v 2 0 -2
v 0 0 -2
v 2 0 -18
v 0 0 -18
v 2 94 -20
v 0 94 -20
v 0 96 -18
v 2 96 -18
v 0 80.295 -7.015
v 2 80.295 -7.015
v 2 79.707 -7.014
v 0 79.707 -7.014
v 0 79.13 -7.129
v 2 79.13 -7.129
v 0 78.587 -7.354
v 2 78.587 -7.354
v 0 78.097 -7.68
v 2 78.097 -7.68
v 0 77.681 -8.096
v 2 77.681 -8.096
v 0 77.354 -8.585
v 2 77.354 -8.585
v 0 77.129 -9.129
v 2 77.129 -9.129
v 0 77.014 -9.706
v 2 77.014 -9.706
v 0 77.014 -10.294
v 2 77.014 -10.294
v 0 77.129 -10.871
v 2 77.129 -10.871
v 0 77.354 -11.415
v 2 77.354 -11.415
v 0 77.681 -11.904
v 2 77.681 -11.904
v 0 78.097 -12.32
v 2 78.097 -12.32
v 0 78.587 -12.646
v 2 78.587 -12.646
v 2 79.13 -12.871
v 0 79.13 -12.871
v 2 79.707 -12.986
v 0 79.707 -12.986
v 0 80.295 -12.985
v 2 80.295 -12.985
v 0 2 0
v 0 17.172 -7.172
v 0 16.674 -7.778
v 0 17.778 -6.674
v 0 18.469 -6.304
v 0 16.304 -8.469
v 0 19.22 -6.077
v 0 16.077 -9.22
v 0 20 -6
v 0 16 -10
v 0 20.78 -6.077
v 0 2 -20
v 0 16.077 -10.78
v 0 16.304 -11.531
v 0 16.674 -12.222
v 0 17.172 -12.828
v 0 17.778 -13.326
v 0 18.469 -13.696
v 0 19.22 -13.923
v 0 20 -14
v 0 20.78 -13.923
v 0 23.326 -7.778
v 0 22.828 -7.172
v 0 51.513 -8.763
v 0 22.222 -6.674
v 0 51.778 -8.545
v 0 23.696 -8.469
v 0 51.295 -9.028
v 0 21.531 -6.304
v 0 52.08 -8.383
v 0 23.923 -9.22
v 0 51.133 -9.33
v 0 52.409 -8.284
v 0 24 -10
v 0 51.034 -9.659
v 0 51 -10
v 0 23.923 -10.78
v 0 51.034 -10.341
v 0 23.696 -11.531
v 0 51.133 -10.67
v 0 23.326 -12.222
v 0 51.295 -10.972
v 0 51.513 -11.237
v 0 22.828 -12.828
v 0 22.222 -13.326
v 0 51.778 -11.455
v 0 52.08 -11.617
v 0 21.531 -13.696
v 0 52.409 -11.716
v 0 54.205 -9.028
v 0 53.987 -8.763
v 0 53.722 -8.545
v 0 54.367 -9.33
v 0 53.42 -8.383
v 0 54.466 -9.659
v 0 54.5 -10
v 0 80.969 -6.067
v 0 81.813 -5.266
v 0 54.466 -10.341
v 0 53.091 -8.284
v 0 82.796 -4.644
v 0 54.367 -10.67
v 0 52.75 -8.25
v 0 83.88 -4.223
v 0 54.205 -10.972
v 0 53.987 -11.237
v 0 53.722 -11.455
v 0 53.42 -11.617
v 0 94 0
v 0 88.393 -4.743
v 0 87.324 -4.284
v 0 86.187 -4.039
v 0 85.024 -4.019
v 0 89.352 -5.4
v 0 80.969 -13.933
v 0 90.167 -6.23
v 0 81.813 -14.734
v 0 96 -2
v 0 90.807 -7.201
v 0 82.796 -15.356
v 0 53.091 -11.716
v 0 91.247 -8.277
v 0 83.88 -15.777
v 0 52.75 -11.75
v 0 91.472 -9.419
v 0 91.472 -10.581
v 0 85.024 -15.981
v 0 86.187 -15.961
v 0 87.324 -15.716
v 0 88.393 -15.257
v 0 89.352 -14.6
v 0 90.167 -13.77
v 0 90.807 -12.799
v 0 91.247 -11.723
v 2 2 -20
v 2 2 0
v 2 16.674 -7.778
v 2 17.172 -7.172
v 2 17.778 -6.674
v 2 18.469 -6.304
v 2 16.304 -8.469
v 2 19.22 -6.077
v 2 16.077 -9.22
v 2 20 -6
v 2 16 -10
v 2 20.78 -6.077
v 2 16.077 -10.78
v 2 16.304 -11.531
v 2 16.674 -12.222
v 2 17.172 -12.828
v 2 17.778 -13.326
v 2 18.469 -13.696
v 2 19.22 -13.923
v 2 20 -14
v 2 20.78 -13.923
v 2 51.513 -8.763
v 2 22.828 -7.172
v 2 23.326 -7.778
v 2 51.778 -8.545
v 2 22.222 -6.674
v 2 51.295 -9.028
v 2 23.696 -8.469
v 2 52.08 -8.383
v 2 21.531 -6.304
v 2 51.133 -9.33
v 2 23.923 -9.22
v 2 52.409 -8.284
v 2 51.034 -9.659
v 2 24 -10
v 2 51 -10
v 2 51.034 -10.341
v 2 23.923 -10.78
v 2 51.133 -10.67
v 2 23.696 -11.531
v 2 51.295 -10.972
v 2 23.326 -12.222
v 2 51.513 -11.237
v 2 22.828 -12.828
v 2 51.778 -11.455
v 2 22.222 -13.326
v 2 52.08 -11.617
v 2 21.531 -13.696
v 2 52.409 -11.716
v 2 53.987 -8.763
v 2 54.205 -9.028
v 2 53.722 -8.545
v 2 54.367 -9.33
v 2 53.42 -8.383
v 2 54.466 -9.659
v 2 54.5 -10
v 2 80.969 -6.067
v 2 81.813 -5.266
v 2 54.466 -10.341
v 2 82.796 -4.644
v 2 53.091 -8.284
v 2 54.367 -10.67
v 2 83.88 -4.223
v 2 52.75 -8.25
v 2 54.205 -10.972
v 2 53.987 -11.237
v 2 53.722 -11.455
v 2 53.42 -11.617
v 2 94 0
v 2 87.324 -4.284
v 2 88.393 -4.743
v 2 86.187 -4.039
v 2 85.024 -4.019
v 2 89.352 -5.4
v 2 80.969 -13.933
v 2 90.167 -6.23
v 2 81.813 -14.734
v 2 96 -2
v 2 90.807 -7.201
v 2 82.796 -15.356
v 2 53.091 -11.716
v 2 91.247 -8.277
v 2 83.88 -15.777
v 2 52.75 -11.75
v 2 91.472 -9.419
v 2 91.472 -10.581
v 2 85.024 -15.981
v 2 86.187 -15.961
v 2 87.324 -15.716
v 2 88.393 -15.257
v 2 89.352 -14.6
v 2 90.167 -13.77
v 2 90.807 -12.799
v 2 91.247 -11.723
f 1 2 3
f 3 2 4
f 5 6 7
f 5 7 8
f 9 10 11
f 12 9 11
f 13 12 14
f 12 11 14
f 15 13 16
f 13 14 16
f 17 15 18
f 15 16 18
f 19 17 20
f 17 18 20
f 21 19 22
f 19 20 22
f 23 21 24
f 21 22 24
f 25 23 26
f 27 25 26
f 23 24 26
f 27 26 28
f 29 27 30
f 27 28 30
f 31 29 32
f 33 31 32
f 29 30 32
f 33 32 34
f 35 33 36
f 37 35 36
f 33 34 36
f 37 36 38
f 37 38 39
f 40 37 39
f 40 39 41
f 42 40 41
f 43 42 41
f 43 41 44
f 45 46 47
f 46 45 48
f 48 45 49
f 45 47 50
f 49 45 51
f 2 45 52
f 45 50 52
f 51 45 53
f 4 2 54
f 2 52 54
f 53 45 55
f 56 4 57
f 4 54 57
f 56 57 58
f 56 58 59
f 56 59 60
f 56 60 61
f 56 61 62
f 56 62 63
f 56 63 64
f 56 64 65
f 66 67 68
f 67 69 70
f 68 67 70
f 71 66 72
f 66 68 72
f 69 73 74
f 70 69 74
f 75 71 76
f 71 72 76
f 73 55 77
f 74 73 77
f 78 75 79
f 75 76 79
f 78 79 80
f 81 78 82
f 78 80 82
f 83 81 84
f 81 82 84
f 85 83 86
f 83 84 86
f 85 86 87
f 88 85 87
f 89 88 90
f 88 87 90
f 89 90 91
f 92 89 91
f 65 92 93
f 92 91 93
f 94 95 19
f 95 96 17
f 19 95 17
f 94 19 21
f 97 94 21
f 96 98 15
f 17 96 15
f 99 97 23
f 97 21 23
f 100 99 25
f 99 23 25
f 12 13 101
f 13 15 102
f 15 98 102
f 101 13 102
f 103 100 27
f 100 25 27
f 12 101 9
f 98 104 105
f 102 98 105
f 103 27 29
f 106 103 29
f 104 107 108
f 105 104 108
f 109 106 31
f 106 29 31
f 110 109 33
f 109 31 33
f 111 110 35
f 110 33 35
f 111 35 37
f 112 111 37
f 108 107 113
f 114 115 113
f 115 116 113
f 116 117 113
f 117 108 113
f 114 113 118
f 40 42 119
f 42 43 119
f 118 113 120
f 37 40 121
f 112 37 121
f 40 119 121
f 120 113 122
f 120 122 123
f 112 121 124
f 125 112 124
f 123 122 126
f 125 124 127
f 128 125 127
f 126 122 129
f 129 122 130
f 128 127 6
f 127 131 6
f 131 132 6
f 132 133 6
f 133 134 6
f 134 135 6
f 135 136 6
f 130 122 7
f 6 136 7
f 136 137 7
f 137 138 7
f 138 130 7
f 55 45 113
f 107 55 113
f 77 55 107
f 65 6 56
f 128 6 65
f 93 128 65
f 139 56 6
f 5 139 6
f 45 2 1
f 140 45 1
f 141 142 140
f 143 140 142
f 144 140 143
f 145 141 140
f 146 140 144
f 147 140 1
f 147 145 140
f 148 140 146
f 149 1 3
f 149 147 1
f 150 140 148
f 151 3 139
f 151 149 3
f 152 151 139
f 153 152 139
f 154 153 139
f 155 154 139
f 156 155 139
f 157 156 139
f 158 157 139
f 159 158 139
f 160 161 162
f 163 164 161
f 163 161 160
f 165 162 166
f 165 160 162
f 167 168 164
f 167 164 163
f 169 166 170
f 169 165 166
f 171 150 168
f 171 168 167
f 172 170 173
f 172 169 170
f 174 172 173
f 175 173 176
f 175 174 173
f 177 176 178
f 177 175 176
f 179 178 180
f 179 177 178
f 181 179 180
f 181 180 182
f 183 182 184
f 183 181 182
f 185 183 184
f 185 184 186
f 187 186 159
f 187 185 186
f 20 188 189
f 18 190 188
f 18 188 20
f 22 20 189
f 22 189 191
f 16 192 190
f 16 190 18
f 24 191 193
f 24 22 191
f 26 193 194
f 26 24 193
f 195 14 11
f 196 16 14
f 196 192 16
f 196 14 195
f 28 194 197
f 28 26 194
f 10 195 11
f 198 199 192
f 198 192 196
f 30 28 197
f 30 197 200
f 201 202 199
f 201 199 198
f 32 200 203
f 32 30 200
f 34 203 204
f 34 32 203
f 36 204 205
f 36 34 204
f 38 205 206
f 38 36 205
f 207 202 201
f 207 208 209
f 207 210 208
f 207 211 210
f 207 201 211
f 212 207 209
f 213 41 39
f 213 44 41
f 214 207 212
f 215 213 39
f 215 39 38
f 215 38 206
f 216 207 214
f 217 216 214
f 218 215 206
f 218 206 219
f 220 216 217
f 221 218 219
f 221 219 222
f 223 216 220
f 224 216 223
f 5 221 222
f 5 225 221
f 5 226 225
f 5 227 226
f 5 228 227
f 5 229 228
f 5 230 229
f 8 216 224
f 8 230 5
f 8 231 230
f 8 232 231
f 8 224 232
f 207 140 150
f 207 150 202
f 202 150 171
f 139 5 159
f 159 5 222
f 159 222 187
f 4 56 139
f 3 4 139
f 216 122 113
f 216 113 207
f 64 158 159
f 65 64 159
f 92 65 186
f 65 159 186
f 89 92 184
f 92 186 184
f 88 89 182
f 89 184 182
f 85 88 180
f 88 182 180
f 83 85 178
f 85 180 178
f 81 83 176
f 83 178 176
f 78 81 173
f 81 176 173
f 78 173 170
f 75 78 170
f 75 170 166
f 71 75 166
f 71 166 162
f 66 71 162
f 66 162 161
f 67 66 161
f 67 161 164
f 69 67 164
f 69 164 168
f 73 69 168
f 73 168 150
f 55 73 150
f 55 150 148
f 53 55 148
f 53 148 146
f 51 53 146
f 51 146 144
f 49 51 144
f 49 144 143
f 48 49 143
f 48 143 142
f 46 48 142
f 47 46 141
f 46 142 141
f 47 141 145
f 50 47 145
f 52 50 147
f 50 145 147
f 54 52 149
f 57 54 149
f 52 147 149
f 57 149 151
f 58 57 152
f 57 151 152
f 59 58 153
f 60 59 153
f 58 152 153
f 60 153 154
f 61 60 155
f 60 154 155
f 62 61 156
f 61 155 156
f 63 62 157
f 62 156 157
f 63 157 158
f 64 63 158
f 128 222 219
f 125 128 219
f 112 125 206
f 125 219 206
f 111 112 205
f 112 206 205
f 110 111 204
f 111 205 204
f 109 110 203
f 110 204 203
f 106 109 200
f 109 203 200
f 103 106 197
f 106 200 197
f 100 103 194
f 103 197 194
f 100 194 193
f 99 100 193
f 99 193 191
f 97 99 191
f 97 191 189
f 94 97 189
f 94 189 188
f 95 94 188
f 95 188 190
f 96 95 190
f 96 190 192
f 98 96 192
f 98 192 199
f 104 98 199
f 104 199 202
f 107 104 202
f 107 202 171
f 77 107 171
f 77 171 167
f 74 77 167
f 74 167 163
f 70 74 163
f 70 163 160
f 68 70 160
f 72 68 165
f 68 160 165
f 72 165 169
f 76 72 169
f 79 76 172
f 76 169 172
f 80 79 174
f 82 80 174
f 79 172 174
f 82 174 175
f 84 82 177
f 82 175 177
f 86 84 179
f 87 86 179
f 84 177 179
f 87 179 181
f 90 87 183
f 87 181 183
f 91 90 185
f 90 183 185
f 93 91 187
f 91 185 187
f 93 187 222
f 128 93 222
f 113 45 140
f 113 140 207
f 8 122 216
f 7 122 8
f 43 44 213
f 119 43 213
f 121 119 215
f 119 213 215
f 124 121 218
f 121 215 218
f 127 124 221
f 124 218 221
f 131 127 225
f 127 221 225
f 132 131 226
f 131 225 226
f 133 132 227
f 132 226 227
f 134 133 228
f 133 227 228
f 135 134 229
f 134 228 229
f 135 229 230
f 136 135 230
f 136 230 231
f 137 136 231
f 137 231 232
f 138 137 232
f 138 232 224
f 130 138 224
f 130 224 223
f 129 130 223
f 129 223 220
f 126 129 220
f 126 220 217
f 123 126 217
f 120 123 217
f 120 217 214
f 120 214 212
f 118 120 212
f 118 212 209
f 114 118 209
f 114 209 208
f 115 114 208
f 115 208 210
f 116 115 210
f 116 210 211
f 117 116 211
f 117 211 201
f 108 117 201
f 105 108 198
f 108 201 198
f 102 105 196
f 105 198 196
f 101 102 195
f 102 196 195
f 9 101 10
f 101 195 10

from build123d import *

# Parameters (mm, degrees)
SKETCH1_W           = 20
SKETCH1_H           = 96
BOSS_EXTRUDE1_DEPTH = 2
SKETCH2_R           = 1.75
SKETCH2_R_2         = 4
CUT_EXTRUDE1_DEPTH  = 99.081598682
CHAMFER1_SIZE       = 2


with BuildPart() as part:
    # Sketch1 → Boss-Extrude1 (new body)
    with BuildSketch(Plane(origin=(0, 0, 0), x_dir=(0, 0, -1), z_dir=(1, 0, 0))):
        with Locations((10, 48)):
            Rectangle(SKETCH1_W, SKETCH1_H)
    extrude(amount=BOSS_EXTRUDE1_DEPTH)

    # Sketch2 → Cut-Extrude1 (cut, through all)
    with BuildSketch(Plane(origin=(2, 0, 0), x_dir=(0, 0, -1), z_dir=(1, 0, 0))):
        with Locations((10, 52.75)):
            Circle(SKETCH2_R)
        with Locations((10, 20)):
            Circle(SKETCH2_R_2)
        with BuildLine():
            ThreePointArc((12.985415651, 80.295454545), (10, 91.5), (7.014584349, 80.295454545))
            ThreePointArc((7.014584349, 80.295454545), (10, 77), (12.985415651, 80.295454545))
        make_face()
    extrude(amount=-CUT_EXTRUDE1_DEPTH, mode=Mode.SUBTRACT)

    # Chamfer1
    chamfer1_edges = [part.edges().sort_by_distance(p)[0] for p in [
        (1, 96, 0),
        (1, 96, -20),
        (1, 0, -20),
        (1, 0, 0),
    ]]
    chamfer(chamfer1_edges, length=CHAMFER1_SIZE)


solid = part.part
